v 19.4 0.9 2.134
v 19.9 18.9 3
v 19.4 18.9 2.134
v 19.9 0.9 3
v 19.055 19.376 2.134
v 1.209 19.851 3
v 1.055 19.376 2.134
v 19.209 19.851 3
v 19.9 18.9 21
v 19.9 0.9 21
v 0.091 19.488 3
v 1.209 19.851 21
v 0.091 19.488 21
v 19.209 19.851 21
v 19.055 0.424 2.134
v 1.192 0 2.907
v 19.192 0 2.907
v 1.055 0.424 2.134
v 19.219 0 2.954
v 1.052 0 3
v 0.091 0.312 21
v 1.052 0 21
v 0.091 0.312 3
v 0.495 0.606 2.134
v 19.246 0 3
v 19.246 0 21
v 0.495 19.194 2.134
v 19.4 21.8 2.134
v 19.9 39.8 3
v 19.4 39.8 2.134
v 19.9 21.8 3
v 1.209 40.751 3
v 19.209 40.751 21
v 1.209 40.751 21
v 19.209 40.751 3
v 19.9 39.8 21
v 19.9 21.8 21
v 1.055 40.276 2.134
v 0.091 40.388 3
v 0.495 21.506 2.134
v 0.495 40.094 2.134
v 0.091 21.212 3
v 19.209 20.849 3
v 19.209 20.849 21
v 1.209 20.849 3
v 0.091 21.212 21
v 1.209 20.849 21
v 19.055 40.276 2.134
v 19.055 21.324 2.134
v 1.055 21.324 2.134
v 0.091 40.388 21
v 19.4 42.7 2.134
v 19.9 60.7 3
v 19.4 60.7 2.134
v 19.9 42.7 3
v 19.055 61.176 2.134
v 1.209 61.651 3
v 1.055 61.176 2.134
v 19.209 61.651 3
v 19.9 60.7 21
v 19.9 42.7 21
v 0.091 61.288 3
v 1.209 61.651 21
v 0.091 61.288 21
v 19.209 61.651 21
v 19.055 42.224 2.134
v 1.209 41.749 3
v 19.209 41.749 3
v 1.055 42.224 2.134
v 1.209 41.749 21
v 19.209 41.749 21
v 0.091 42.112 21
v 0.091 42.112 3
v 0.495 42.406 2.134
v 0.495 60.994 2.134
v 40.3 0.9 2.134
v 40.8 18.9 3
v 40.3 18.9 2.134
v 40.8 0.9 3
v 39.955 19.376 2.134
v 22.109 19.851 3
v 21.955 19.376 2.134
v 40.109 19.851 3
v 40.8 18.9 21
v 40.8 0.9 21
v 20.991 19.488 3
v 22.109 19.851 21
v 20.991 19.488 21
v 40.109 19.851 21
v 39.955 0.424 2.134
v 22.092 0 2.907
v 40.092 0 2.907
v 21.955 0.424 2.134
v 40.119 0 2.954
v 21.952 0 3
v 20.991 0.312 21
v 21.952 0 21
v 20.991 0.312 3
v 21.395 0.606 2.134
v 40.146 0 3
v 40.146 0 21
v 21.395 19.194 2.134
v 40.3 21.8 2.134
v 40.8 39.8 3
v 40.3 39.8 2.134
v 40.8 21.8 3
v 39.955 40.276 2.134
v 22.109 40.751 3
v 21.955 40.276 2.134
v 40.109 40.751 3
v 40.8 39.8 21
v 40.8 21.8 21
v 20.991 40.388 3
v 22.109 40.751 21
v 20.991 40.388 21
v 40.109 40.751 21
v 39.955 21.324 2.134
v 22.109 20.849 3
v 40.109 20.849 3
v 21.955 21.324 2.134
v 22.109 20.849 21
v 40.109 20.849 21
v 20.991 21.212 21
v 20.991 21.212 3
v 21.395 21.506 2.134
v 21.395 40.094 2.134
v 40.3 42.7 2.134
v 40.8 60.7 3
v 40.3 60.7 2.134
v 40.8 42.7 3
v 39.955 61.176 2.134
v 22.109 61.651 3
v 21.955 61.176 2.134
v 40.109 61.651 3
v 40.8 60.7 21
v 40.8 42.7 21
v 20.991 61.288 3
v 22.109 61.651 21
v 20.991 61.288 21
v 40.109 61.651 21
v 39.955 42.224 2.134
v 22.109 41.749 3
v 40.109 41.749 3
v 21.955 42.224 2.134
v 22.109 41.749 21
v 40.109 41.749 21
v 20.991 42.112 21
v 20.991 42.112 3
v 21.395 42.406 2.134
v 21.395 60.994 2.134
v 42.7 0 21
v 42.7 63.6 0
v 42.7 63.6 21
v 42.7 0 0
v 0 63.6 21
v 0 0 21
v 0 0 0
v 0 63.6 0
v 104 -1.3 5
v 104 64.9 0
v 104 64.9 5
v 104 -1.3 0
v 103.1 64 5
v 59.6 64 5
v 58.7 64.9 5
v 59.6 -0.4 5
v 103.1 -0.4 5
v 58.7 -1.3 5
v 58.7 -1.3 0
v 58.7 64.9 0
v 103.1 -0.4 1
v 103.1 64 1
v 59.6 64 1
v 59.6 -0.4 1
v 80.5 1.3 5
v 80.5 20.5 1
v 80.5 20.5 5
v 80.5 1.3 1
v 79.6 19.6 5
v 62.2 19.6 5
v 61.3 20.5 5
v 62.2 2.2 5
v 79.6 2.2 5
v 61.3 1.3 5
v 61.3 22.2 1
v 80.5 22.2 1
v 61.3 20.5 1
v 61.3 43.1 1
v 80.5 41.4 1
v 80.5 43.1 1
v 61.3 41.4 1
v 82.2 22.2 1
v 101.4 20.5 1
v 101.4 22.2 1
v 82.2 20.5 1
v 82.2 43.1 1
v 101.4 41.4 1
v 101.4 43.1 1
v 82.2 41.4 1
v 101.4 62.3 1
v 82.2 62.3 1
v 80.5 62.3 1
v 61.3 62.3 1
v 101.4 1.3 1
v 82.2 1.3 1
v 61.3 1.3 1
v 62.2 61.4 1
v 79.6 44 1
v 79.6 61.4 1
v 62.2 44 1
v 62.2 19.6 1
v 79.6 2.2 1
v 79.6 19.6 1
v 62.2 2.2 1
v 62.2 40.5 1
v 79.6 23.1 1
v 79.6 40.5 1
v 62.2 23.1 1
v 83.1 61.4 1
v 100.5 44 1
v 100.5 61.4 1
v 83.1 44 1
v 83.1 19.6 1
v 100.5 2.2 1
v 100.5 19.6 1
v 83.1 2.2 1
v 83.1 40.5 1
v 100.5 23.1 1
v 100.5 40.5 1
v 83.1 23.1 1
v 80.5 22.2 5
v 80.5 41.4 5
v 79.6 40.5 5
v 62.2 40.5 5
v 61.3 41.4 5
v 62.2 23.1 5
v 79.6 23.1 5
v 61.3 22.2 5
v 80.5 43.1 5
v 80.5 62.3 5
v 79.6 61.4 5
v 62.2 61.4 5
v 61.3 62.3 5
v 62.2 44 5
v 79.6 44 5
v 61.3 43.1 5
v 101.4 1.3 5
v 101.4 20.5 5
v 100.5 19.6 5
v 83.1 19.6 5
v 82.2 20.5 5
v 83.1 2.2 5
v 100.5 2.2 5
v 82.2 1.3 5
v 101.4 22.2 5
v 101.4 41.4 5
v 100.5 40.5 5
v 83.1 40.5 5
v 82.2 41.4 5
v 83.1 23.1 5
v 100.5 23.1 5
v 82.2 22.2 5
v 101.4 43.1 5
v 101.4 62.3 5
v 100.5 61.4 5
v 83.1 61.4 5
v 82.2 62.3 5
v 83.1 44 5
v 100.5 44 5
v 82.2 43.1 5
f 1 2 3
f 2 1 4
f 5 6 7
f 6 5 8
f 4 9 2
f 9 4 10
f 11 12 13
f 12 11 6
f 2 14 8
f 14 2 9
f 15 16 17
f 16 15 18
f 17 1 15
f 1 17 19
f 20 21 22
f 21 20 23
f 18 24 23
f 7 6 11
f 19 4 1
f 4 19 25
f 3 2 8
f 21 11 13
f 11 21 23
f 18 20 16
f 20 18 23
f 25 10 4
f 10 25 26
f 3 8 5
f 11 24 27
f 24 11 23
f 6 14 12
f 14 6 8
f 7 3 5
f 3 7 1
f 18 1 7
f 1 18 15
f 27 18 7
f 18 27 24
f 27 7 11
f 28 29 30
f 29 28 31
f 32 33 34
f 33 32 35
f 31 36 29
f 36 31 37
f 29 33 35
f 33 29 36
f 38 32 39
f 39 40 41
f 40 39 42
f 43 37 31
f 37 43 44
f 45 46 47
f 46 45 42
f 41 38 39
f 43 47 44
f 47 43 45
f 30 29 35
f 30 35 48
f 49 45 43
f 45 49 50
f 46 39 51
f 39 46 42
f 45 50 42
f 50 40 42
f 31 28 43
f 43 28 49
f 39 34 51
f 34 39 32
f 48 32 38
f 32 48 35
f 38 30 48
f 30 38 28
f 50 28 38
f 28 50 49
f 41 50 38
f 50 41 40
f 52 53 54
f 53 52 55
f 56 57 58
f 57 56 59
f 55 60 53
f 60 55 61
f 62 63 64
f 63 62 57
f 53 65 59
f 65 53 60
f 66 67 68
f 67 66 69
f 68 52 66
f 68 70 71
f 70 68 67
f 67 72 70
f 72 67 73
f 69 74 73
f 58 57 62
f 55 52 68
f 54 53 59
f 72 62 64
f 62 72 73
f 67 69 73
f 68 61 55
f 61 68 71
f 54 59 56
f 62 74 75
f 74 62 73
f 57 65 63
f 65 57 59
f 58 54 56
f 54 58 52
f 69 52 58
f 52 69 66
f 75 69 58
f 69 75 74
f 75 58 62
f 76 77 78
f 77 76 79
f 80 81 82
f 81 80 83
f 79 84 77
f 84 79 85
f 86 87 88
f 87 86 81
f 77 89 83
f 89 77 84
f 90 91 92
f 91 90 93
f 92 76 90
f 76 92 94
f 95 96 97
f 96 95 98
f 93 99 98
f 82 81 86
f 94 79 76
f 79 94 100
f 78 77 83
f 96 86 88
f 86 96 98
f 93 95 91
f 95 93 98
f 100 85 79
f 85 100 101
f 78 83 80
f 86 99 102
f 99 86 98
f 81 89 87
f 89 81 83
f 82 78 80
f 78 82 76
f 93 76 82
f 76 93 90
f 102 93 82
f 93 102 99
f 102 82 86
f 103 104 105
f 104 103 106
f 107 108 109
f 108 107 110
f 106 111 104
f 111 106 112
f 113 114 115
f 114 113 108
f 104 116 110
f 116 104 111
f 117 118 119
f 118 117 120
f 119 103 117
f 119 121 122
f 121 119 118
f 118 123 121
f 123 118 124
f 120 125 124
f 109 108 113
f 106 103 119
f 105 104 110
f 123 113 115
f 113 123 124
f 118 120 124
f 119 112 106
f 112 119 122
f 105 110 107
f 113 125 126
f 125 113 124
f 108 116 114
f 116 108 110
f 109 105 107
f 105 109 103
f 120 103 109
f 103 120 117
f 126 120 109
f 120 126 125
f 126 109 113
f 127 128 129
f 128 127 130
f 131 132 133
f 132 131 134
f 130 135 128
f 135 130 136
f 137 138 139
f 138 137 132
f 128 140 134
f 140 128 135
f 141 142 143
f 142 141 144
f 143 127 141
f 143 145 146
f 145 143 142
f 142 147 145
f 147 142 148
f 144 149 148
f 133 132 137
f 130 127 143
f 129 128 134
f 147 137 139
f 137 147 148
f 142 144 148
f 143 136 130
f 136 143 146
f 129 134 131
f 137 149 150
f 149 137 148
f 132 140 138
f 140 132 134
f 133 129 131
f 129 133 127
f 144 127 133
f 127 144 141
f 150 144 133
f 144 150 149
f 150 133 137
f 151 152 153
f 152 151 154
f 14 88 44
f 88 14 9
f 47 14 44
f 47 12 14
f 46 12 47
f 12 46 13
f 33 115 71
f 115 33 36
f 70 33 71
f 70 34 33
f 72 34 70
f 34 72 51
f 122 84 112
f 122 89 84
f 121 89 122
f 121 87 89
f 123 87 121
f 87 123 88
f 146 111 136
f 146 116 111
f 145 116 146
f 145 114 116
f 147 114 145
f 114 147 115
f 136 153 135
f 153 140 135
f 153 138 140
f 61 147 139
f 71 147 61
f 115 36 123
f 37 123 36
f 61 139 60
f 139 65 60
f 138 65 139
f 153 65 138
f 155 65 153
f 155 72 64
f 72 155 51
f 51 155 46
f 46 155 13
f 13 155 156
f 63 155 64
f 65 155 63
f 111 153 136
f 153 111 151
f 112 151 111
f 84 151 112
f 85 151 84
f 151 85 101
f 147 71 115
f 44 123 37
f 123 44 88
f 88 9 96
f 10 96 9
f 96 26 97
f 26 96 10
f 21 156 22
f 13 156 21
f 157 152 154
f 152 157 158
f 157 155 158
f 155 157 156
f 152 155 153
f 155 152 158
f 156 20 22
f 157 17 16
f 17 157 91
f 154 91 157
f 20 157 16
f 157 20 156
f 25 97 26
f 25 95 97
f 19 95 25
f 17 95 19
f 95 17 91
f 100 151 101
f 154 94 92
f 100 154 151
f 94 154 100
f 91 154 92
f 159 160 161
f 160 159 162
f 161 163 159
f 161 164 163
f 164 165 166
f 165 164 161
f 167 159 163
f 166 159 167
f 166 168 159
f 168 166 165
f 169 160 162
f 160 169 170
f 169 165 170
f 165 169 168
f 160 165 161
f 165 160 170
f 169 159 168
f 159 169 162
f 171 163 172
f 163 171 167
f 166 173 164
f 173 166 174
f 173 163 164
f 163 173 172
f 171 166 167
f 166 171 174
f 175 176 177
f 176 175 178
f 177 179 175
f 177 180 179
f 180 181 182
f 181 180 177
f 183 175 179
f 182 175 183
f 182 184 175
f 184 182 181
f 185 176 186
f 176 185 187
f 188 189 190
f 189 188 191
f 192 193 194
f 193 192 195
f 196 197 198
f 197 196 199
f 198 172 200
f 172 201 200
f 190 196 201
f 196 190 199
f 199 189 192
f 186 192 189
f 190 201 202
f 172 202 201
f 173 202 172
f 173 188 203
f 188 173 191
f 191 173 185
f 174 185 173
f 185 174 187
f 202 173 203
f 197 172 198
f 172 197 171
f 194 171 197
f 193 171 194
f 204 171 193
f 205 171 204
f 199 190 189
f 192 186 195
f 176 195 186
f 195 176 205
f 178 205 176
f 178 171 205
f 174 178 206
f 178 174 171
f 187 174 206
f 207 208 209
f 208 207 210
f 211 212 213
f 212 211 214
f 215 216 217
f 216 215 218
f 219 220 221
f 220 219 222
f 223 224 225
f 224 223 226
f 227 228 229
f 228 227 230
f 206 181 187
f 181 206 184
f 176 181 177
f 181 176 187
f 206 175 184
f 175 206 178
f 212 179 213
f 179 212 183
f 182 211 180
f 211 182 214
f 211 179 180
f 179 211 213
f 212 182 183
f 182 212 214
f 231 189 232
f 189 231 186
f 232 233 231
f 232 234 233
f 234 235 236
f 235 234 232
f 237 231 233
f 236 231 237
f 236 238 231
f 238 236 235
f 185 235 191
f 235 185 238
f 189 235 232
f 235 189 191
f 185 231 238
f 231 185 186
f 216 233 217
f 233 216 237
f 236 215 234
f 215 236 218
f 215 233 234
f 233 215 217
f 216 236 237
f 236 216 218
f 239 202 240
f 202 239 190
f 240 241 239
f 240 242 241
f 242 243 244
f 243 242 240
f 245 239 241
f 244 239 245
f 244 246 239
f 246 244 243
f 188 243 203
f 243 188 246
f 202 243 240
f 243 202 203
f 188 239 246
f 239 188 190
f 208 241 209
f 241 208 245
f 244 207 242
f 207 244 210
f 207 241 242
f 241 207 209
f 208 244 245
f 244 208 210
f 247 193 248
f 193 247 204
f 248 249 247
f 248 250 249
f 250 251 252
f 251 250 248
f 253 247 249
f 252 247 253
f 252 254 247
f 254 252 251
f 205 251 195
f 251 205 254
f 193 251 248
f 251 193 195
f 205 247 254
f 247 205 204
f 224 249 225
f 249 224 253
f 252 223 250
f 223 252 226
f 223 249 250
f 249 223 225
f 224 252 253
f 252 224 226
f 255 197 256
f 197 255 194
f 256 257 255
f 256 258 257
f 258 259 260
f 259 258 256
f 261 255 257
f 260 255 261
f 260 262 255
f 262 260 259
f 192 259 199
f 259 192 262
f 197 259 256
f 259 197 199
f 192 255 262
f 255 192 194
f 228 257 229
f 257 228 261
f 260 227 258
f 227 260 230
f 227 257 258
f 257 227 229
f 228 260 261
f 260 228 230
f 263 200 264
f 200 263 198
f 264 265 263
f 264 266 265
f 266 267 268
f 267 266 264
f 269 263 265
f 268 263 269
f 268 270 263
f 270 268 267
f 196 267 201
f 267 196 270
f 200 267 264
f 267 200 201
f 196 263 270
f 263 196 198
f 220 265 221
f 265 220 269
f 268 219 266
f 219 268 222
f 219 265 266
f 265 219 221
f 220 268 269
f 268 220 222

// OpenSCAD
/* Parametric compartment box by Tomi T. Salo <ttsalo@iki.fi> 2011. */


/* columns: the number of compartments in the X-direction.
   rows: the number of compartments in the Y-direction.
*/
columns =2;
rows = 3;
columnWidth = 20;
rowHeight = 20; 
/*
   columnWidth: the internal width of each compartment (in the X-direction).
   rowHeight: the internal height of each compartment (in the Y-direction). 
   boxThickness: the internal thichness of the compartments (in the 
     Z-direction).
   bottomThickness: the thickness of the bottom material.
   topThickness: the thickness of the top material.
   outerWallThickness: the thickness of the outer walls of the bottom 
     section and the outer lip of the top section.
   innerWallThickness: the thickness of the internal walls between 
     compartments.
   topLipThickness: the thickness of the short walls protruding into 
     the compartments.
   topLipHeight: the height of the short walls protruding into the 
     compartments.
   topFitTolerance: extra space between the bottom section parts and the 
     corresponding grooves in the top section (this much between every edge). 
*/

module compartmentBox(columns, rows, columnWidth, rowHeight, boxThickness, 
                      bottomThickness, topThickness, outerWallThickness, 
                      innerWallThickness, topLipThickness, topLipHeight, 
                      topFitTolerance, isBottom) {
  if (isBottom)
    {
      /* The bottom section is modelled by one big cube with the compartments
         subtracted out. */
      difference() {
        cube([columns * columnWidth + (columns - 1) * innerWallThickness + 
              2 * outerWallThickness,
              rows * rowHeight + (rows - 1) * innerWallThickness + 
              2 * outerWallThickness,
              bottomThickness + boxThickness], center = false);
        for (i = [0 : (columns - 1)])
          {
            for (j = [0 : (rows - 1)])
              {
                translate([outerWallThickness + (columnWidth + 
                                                 innerWallThickness) * i,
                           outerWallThickness + (rowHeight + 
                                                 innerWallThickness) * j,
                           bottomThickness+2])
                 minkowski()
                {
                  cube([columnWidth -2 , rowHeight-2, boxThickness-2]);
                  sphere(r=1);
                } 
              }
          }
      }
    } else {
    /* The top is made of an union of: 
       1) Top plate 
       2) Outer top lip made with a difference
       3) Internal compartment lips each made by subtracting the hollow 
          portion out of a solid block. */
    union() {
      translate([-topFitTolerance, -topFitTolerance, 0])
        cube([columns * columnWidth + (columns - 1) * innerWallThickness + 
              2 * outerWallThickness + 2 * topFitTolerance,
              rows * rowHeight + (rows - 1) * innerWallThickness + 
              2 * outerWallThickness +
	      2 * topFitTolerance, topThickness], center = false);
      difference () {
        translate([-(outerWallThickness + topFitTolerance) , 
                   -(outerWallThickness + topFitTolerance), 0])
          cube([columns * columnWidth + (columns - 1) * innerWallThickness + 
                4 * outerWallThickness + 2 * topFitTolerance,
                rows * rowHeight + (rows - 1) * innerWallThickness + 
                4 * outerWallThickness +
                2 * topFitTolerance,
                topThickness + topLipHeight], center = false);
        translate([-topFitTolerance, -topFitTolerance, 0])
          cube([columns * columnWidth + (columns - 1) * innerWallThickness + 
                2 * outerWallThickness + 2 * topFitTolerance,
                rows * rowHeight + (rows - 1) * innerWallThickness + 
                2 * outerWallThickness + 2 * topFitTolerance,
                topThickness + topLipHeight], center = false);
      }
      for (i = [0 : (columns - 1)])
        {
          for (j = [0 : (rows - 1)])
            {
              difference () {
                translate([outerWallThickness + (columnWidth + 
                                                 innerWallThickness) * i +
                           topFitTolerance,
                           outerWallThickness + (rowHeight + 
                                                 innerWallThickness) * j +
                           topFitTolerance,
                           topThickness]) 
                  cube([columnWidth - 2 * topFitTolerance , 
                        rowHeight - 2 * topFitTolerance, topLipHeight]);
                translate([outerWallThickness + (columnWidth + 
                                                 innerWallThickness) * i + 
                           topLipThickness + topFitTolerance,
                           outerWallThickness + (rowHeight + 
                                                 innerWallThickness) * j +
                           topLipThickness + topFitTolerance,
                           topThickness]) cube([columnWidth - 
                                                2 * topLipThickness - 
                                                2 * topFitTolerance, 
                                                rowHeight - 
                                                2 * topLipThickness - 
                                                2 * topFitTolerance, 
                                                topLipHeight]);
              }
            }
        }
    }
  }
}

compartmentBox(
    columns,
    rows,
    columnWidth,
    rowHeight,
    20, 1, 1, 2*.45, 2*.45, 2*.45, 4, 0.4, true);
translate([(columns + 1)*columnWidth,0,0])compartmentBox(
    columns,
    rows,
    columnWidth, 
    rowHeight, 20, 1, 1, 2*.45, 2*.45, 2*.45, 4, 0.4, false);
